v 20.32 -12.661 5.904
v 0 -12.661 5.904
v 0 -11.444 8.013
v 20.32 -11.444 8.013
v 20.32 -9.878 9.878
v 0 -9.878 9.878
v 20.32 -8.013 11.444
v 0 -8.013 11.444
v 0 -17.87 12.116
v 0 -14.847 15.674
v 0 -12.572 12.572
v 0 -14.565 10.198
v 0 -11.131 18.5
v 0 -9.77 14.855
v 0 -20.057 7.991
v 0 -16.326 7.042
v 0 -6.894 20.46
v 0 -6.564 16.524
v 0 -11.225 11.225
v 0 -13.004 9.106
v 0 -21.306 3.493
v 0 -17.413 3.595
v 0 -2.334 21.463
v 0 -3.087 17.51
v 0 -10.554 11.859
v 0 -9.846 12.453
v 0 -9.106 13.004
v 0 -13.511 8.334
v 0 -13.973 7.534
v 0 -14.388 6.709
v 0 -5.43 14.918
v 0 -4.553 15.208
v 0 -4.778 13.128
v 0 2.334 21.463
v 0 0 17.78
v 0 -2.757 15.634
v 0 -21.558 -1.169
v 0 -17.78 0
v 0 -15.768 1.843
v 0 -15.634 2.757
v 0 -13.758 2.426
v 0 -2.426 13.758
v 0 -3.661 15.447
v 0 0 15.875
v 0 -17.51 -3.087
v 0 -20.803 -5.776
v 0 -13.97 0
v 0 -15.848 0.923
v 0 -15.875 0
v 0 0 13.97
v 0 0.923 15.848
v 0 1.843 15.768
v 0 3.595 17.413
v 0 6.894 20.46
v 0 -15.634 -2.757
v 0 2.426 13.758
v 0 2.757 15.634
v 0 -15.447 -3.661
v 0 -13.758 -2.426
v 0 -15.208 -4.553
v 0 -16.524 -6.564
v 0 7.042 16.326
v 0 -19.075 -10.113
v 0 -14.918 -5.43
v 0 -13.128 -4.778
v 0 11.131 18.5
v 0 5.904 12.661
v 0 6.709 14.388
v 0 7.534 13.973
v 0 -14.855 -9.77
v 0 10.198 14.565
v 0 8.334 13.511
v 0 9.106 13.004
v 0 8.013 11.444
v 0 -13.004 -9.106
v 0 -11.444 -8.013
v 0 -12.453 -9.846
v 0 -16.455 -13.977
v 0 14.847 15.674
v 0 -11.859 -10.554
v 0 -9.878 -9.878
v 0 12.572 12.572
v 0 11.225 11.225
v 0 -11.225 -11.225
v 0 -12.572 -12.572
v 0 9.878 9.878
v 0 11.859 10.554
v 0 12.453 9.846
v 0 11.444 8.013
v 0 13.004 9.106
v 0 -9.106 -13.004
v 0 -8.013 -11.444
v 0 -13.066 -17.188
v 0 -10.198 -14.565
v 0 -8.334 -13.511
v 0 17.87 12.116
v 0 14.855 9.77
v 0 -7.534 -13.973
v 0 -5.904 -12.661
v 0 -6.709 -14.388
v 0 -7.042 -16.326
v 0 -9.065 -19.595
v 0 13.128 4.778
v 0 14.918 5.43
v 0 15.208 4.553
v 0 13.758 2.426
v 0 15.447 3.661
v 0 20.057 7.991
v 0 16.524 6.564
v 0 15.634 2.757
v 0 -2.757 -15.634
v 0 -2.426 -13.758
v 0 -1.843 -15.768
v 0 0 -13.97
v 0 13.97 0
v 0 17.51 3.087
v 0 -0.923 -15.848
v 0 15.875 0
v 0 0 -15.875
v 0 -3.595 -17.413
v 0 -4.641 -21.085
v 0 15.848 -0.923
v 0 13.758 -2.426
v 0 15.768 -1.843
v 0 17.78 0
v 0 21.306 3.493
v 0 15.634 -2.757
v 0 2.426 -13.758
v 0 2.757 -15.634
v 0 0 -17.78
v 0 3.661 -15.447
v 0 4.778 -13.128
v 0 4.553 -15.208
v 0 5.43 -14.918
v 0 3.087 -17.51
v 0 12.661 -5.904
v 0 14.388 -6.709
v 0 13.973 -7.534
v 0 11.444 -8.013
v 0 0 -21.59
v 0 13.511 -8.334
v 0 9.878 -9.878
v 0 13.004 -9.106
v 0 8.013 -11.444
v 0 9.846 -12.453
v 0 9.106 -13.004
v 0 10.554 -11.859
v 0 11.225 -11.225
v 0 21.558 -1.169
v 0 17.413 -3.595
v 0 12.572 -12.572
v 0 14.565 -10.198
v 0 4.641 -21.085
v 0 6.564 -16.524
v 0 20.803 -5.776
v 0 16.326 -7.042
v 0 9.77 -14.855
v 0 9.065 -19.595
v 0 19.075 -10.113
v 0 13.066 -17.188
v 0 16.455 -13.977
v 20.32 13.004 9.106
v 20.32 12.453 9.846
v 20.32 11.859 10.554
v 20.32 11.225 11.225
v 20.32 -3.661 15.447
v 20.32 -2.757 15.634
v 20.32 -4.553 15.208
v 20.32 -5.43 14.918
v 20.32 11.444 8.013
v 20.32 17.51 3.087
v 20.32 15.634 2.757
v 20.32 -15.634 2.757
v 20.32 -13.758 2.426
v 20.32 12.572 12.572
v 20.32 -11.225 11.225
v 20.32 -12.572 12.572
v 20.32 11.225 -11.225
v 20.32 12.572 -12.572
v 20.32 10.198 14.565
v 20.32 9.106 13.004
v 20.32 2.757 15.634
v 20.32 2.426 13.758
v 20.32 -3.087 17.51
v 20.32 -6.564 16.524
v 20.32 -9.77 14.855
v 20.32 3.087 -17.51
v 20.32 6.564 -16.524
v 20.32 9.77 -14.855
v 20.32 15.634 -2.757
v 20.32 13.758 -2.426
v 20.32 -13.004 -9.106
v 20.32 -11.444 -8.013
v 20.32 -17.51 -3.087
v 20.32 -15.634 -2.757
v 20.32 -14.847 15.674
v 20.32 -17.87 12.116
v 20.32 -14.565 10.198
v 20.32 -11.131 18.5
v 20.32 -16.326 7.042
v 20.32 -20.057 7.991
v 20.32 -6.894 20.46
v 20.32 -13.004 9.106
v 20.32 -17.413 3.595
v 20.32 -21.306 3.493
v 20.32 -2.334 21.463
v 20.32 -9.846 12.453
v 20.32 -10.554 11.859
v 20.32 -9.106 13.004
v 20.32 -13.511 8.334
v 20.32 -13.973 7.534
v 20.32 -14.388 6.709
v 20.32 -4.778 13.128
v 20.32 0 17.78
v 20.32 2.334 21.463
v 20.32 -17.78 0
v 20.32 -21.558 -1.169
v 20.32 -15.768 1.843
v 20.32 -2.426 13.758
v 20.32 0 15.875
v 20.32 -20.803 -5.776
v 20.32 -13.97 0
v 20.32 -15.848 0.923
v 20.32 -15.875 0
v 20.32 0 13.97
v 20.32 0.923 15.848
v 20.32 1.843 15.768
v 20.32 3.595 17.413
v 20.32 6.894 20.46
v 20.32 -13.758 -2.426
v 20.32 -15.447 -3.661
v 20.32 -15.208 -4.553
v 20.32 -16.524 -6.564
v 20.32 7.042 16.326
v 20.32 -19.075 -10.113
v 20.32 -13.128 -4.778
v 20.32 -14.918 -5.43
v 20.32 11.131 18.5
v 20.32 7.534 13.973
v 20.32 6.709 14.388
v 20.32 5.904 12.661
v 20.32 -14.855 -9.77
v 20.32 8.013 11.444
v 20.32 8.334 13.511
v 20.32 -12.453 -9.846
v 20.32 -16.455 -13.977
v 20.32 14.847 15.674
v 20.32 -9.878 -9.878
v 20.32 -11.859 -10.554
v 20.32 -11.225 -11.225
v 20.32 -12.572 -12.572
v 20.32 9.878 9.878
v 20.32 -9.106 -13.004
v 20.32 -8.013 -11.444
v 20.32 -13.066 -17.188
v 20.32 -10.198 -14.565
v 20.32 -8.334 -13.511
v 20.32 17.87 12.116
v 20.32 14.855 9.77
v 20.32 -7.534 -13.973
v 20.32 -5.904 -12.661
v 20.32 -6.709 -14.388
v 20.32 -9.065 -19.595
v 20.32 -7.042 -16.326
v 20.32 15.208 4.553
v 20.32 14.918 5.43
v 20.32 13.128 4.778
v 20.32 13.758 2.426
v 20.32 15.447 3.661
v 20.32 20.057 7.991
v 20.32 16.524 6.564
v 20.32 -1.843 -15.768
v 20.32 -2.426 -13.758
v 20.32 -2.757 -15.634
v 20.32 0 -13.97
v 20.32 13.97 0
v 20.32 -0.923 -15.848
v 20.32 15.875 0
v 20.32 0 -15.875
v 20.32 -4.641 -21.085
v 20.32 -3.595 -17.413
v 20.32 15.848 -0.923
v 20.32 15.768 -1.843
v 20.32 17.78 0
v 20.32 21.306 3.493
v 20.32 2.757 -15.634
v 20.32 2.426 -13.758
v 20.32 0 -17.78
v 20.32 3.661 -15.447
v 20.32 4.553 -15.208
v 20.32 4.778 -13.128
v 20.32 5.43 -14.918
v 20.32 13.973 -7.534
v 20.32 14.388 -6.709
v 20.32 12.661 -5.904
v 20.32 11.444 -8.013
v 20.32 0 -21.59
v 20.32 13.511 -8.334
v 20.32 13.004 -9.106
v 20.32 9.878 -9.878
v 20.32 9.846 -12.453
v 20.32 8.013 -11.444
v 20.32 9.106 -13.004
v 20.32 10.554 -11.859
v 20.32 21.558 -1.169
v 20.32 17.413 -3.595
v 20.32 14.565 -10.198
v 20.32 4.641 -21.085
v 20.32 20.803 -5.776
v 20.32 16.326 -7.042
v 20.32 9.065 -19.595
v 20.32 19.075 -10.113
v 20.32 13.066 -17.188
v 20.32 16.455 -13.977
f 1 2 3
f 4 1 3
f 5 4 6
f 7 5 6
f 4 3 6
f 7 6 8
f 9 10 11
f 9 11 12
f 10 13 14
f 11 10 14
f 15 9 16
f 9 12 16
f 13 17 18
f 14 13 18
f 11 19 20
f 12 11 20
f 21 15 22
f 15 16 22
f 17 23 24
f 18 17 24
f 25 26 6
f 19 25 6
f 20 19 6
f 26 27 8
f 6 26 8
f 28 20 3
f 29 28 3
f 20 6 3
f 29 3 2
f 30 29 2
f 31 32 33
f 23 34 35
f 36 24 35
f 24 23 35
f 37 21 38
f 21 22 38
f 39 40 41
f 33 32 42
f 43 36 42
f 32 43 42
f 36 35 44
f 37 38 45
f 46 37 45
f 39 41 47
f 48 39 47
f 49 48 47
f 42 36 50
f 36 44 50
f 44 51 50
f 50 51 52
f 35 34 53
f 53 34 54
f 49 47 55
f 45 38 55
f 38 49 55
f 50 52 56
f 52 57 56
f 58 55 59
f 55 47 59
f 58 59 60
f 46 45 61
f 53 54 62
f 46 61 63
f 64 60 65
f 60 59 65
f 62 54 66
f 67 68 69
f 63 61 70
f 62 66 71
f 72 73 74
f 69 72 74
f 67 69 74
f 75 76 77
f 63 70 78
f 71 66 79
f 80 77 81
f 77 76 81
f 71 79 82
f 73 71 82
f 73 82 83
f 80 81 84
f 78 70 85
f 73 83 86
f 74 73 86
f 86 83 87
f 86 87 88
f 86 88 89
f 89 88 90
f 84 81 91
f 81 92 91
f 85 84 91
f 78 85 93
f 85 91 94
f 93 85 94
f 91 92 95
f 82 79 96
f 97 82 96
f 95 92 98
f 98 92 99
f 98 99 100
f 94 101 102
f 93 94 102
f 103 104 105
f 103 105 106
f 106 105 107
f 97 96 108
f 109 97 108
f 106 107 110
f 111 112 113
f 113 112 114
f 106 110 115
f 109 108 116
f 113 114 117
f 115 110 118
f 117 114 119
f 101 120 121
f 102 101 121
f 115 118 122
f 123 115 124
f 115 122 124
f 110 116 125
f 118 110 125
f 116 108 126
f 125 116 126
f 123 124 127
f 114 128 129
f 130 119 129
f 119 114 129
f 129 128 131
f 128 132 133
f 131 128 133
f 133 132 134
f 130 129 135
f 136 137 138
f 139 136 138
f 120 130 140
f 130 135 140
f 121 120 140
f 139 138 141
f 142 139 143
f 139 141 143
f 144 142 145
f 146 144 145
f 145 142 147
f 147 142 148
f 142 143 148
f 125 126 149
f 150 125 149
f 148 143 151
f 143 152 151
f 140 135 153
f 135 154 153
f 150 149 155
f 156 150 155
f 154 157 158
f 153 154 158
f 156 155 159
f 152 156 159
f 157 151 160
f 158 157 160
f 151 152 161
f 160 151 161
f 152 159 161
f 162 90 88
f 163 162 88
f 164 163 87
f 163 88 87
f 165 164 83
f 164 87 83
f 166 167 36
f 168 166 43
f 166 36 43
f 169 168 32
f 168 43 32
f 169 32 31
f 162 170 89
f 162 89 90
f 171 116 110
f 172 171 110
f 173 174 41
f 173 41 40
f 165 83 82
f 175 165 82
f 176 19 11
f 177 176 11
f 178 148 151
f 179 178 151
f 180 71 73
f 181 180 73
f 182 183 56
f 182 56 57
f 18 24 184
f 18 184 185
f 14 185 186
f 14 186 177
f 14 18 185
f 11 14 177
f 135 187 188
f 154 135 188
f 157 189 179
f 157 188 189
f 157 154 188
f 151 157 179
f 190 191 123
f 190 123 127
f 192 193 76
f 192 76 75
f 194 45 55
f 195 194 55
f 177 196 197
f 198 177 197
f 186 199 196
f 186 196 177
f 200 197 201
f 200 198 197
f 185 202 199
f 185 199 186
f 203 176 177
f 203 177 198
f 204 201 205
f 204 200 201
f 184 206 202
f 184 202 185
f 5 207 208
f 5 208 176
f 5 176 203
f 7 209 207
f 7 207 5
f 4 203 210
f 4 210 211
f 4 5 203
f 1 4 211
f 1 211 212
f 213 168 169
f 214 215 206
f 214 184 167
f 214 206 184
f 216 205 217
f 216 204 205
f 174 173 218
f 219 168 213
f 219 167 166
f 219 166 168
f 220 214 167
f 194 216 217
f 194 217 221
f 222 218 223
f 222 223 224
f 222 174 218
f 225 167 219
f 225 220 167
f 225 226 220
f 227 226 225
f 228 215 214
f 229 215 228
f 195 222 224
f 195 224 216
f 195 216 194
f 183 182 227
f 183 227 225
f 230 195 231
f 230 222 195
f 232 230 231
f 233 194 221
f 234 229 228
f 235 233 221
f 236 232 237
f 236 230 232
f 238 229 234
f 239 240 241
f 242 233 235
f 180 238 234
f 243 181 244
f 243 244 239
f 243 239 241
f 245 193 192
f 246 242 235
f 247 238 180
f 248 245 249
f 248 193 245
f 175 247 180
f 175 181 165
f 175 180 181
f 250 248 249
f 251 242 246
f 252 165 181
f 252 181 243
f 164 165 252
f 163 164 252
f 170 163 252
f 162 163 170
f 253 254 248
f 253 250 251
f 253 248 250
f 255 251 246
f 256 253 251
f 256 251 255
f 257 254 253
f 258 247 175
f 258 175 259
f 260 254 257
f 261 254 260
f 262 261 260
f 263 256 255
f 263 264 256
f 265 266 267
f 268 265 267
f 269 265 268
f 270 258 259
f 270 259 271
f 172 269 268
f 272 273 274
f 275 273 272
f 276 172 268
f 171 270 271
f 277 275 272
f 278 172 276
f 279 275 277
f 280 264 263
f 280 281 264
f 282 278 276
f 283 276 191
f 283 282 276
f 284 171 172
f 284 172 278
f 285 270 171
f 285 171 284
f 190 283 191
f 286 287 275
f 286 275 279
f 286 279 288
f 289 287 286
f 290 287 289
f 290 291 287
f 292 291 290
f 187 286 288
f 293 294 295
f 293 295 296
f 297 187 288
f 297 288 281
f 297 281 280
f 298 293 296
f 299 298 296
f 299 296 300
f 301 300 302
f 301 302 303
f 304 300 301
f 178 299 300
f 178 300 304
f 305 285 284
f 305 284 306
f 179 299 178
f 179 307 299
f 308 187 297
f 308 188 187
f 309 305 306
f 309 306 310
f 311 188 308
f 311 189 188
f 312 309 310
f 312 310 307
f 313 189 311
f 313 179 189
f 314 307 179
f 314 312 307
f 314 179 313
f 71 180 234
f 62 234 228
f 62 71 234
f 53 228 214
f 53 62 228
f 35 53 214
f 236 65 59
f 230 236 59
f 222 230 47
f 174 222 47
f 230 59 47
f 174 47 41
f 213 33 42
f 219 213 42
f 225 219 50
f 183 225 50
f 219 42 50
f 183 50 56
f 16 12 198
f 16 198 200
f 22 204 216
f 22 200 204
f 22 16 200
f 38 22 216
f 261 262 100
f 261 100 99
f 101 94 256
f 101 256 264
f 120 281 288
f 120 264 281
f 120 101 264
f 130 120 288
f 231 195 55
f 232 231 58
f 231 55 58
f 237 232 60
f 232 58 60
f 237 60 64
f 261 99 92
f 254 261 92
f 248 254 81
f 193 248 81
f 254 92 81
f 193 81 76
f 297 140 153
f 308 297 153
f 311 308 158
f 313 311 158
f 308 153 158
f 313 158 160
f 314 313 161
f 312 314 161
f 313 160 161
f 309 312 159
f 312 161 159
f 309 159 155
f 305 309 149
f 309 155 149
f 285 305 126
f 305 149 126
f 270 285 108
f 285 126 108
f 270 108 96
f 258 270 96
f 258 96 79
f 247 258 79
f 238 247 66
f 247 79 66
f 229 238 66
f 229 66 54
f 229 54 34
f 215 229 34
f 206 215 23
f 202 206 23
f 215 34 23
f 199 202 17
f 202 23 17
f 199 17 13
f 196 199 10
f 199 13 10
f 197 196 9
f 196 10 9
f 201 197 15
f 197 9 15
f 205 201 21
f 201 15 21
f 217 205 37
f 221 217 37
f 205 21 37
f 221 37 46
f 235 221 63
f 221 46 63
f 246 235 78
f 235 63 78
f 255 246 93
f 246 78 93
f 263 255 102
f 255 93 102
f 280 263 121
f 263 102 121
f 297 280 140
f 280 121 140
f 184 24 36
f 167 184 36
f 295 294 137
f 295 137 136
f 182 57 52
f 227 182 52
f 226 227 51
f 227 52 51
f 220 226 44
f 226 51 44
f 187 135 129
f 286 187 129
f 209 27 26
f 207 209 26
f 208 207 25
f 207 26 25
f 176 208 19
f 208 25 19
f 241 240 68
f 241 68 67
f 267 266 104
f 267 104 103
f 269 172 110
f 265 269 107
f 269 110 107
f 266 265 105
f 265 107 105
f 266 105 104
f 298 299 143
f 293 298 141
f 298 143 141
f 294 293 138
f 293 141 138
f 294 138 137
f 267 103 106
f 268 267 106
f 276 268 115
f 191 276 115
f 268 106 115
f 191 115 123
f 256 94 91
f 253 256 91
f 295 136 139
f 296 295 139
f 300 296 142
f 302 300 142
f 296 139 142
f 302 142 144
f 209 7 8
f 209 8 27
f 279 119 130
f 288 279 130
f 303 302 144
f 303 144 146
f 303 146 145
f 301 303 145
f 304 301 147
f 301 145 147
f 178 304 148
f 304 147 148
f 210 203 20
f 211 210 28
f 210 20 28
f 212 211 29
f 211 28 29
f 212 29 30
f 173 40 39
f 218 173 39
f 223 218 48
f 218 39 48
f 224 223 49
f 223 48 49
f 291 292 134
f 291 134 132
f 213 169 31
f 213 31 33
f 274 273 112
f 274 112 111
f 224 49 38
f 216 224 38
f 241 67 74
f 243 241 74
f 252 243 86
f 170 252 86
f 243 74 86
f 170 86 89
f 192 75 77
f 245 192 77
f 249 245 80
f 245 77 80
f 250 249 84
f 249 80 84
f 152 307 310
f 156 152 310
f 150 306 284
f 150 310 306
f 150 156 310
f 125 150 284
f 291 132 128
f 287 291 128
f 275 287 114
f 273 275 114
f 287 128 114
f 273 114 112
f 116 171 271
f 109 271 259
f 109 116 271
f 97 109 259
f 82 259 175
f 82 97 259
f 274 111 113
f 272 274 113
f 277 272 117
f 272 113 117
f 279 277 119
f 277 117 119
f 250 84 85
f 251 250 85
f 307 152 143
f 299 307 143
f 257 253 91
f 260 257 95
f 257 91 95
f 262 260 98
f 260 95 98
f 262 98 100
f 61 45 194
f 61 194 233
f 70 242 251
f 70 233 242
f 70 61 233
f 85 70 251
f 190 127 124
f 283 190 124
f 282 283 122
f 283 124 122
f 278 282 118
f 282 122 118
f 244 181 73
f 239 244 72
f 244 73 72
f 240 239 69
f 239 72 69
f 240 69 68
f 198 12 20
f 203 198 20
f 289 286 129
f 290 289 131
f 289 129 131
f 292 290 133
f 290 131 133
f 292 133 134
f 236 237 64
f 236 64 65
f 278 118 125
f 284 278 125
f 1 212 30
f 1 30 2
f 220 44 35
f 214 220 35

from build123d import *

# Parameters (mm, degrees)
SKETCH1_R           = 21.59
SKETCH1_R_2         = 17.78
BOSS_EXTRUDE1_DEPTH = 20.32
BOSS_EXTRUDE2_DEPTH = 20.32
CIRPATTERN1_COUNT   = 8


with BuildPart() as part:
    # Sketch1 → Boss-Extrude1 (new body)
    with BuildSketch(Plane.YZ):
        with Locations(Location((0, 0, 0), (0, 0, 270))):
            Circle(SKETCH1_R)
        with Locations(Location((0, 0, 0), (0, 0, 270))):
            Circle(SKETCH1_R_2, mode=Mode.SUBTRACT)
    extrude(amount=BOSS_EXTRUDE1_DEPTH)

    # Sketch3 → Boss-Extrude2 (add)
    with BuildSketch(Plane.YZ):
        with BuildLine():
            Line((-3.087464599, 17.509881849), (-2.75666482, 15.633823079))
            ThreePointArc((-2.75666482, 15.633823079), (-4.108752341, 15.334072492), (-5.429569775, 14.917620355))
            Line((-5.429569775, 14.917620355), (-4.778021402, 13.127505912))
            ThreePointArc((-4.778021402, 13.127505912), (-1.217565726, 13.916839932), (2.425865042, 13.75776431))
            Line((2.425865042, 13.75776431), (2.75666482, 15.633823079))
            ThreePointArc((2.75666482, 15.633823079), (1.383597416, 15.814590832), (0, 15.875))
            Line((0, 15.875), (0, 17.78))
            ThreePointArc((0, 17.78), (-1.549629106, 17.712341732), (-3.087464599, 17.509881849))
        make_face()
    boss_extrude2 = extrude(amount=BOSS_EXTRUDE2_DEPTH)

    # CirPattern1: Boss-Extrude2 ×8 about axis
    cirpattern1_axis = Axis((0, 0, 0), (1, 0, 0))
    for i in range(1, CIRPATTERN1_COUNT):
        add(boss_extrude2.rotate(cirpattern1_axis, i * 360 / CIRPATTERN1_COUNT))


solid = part.part
